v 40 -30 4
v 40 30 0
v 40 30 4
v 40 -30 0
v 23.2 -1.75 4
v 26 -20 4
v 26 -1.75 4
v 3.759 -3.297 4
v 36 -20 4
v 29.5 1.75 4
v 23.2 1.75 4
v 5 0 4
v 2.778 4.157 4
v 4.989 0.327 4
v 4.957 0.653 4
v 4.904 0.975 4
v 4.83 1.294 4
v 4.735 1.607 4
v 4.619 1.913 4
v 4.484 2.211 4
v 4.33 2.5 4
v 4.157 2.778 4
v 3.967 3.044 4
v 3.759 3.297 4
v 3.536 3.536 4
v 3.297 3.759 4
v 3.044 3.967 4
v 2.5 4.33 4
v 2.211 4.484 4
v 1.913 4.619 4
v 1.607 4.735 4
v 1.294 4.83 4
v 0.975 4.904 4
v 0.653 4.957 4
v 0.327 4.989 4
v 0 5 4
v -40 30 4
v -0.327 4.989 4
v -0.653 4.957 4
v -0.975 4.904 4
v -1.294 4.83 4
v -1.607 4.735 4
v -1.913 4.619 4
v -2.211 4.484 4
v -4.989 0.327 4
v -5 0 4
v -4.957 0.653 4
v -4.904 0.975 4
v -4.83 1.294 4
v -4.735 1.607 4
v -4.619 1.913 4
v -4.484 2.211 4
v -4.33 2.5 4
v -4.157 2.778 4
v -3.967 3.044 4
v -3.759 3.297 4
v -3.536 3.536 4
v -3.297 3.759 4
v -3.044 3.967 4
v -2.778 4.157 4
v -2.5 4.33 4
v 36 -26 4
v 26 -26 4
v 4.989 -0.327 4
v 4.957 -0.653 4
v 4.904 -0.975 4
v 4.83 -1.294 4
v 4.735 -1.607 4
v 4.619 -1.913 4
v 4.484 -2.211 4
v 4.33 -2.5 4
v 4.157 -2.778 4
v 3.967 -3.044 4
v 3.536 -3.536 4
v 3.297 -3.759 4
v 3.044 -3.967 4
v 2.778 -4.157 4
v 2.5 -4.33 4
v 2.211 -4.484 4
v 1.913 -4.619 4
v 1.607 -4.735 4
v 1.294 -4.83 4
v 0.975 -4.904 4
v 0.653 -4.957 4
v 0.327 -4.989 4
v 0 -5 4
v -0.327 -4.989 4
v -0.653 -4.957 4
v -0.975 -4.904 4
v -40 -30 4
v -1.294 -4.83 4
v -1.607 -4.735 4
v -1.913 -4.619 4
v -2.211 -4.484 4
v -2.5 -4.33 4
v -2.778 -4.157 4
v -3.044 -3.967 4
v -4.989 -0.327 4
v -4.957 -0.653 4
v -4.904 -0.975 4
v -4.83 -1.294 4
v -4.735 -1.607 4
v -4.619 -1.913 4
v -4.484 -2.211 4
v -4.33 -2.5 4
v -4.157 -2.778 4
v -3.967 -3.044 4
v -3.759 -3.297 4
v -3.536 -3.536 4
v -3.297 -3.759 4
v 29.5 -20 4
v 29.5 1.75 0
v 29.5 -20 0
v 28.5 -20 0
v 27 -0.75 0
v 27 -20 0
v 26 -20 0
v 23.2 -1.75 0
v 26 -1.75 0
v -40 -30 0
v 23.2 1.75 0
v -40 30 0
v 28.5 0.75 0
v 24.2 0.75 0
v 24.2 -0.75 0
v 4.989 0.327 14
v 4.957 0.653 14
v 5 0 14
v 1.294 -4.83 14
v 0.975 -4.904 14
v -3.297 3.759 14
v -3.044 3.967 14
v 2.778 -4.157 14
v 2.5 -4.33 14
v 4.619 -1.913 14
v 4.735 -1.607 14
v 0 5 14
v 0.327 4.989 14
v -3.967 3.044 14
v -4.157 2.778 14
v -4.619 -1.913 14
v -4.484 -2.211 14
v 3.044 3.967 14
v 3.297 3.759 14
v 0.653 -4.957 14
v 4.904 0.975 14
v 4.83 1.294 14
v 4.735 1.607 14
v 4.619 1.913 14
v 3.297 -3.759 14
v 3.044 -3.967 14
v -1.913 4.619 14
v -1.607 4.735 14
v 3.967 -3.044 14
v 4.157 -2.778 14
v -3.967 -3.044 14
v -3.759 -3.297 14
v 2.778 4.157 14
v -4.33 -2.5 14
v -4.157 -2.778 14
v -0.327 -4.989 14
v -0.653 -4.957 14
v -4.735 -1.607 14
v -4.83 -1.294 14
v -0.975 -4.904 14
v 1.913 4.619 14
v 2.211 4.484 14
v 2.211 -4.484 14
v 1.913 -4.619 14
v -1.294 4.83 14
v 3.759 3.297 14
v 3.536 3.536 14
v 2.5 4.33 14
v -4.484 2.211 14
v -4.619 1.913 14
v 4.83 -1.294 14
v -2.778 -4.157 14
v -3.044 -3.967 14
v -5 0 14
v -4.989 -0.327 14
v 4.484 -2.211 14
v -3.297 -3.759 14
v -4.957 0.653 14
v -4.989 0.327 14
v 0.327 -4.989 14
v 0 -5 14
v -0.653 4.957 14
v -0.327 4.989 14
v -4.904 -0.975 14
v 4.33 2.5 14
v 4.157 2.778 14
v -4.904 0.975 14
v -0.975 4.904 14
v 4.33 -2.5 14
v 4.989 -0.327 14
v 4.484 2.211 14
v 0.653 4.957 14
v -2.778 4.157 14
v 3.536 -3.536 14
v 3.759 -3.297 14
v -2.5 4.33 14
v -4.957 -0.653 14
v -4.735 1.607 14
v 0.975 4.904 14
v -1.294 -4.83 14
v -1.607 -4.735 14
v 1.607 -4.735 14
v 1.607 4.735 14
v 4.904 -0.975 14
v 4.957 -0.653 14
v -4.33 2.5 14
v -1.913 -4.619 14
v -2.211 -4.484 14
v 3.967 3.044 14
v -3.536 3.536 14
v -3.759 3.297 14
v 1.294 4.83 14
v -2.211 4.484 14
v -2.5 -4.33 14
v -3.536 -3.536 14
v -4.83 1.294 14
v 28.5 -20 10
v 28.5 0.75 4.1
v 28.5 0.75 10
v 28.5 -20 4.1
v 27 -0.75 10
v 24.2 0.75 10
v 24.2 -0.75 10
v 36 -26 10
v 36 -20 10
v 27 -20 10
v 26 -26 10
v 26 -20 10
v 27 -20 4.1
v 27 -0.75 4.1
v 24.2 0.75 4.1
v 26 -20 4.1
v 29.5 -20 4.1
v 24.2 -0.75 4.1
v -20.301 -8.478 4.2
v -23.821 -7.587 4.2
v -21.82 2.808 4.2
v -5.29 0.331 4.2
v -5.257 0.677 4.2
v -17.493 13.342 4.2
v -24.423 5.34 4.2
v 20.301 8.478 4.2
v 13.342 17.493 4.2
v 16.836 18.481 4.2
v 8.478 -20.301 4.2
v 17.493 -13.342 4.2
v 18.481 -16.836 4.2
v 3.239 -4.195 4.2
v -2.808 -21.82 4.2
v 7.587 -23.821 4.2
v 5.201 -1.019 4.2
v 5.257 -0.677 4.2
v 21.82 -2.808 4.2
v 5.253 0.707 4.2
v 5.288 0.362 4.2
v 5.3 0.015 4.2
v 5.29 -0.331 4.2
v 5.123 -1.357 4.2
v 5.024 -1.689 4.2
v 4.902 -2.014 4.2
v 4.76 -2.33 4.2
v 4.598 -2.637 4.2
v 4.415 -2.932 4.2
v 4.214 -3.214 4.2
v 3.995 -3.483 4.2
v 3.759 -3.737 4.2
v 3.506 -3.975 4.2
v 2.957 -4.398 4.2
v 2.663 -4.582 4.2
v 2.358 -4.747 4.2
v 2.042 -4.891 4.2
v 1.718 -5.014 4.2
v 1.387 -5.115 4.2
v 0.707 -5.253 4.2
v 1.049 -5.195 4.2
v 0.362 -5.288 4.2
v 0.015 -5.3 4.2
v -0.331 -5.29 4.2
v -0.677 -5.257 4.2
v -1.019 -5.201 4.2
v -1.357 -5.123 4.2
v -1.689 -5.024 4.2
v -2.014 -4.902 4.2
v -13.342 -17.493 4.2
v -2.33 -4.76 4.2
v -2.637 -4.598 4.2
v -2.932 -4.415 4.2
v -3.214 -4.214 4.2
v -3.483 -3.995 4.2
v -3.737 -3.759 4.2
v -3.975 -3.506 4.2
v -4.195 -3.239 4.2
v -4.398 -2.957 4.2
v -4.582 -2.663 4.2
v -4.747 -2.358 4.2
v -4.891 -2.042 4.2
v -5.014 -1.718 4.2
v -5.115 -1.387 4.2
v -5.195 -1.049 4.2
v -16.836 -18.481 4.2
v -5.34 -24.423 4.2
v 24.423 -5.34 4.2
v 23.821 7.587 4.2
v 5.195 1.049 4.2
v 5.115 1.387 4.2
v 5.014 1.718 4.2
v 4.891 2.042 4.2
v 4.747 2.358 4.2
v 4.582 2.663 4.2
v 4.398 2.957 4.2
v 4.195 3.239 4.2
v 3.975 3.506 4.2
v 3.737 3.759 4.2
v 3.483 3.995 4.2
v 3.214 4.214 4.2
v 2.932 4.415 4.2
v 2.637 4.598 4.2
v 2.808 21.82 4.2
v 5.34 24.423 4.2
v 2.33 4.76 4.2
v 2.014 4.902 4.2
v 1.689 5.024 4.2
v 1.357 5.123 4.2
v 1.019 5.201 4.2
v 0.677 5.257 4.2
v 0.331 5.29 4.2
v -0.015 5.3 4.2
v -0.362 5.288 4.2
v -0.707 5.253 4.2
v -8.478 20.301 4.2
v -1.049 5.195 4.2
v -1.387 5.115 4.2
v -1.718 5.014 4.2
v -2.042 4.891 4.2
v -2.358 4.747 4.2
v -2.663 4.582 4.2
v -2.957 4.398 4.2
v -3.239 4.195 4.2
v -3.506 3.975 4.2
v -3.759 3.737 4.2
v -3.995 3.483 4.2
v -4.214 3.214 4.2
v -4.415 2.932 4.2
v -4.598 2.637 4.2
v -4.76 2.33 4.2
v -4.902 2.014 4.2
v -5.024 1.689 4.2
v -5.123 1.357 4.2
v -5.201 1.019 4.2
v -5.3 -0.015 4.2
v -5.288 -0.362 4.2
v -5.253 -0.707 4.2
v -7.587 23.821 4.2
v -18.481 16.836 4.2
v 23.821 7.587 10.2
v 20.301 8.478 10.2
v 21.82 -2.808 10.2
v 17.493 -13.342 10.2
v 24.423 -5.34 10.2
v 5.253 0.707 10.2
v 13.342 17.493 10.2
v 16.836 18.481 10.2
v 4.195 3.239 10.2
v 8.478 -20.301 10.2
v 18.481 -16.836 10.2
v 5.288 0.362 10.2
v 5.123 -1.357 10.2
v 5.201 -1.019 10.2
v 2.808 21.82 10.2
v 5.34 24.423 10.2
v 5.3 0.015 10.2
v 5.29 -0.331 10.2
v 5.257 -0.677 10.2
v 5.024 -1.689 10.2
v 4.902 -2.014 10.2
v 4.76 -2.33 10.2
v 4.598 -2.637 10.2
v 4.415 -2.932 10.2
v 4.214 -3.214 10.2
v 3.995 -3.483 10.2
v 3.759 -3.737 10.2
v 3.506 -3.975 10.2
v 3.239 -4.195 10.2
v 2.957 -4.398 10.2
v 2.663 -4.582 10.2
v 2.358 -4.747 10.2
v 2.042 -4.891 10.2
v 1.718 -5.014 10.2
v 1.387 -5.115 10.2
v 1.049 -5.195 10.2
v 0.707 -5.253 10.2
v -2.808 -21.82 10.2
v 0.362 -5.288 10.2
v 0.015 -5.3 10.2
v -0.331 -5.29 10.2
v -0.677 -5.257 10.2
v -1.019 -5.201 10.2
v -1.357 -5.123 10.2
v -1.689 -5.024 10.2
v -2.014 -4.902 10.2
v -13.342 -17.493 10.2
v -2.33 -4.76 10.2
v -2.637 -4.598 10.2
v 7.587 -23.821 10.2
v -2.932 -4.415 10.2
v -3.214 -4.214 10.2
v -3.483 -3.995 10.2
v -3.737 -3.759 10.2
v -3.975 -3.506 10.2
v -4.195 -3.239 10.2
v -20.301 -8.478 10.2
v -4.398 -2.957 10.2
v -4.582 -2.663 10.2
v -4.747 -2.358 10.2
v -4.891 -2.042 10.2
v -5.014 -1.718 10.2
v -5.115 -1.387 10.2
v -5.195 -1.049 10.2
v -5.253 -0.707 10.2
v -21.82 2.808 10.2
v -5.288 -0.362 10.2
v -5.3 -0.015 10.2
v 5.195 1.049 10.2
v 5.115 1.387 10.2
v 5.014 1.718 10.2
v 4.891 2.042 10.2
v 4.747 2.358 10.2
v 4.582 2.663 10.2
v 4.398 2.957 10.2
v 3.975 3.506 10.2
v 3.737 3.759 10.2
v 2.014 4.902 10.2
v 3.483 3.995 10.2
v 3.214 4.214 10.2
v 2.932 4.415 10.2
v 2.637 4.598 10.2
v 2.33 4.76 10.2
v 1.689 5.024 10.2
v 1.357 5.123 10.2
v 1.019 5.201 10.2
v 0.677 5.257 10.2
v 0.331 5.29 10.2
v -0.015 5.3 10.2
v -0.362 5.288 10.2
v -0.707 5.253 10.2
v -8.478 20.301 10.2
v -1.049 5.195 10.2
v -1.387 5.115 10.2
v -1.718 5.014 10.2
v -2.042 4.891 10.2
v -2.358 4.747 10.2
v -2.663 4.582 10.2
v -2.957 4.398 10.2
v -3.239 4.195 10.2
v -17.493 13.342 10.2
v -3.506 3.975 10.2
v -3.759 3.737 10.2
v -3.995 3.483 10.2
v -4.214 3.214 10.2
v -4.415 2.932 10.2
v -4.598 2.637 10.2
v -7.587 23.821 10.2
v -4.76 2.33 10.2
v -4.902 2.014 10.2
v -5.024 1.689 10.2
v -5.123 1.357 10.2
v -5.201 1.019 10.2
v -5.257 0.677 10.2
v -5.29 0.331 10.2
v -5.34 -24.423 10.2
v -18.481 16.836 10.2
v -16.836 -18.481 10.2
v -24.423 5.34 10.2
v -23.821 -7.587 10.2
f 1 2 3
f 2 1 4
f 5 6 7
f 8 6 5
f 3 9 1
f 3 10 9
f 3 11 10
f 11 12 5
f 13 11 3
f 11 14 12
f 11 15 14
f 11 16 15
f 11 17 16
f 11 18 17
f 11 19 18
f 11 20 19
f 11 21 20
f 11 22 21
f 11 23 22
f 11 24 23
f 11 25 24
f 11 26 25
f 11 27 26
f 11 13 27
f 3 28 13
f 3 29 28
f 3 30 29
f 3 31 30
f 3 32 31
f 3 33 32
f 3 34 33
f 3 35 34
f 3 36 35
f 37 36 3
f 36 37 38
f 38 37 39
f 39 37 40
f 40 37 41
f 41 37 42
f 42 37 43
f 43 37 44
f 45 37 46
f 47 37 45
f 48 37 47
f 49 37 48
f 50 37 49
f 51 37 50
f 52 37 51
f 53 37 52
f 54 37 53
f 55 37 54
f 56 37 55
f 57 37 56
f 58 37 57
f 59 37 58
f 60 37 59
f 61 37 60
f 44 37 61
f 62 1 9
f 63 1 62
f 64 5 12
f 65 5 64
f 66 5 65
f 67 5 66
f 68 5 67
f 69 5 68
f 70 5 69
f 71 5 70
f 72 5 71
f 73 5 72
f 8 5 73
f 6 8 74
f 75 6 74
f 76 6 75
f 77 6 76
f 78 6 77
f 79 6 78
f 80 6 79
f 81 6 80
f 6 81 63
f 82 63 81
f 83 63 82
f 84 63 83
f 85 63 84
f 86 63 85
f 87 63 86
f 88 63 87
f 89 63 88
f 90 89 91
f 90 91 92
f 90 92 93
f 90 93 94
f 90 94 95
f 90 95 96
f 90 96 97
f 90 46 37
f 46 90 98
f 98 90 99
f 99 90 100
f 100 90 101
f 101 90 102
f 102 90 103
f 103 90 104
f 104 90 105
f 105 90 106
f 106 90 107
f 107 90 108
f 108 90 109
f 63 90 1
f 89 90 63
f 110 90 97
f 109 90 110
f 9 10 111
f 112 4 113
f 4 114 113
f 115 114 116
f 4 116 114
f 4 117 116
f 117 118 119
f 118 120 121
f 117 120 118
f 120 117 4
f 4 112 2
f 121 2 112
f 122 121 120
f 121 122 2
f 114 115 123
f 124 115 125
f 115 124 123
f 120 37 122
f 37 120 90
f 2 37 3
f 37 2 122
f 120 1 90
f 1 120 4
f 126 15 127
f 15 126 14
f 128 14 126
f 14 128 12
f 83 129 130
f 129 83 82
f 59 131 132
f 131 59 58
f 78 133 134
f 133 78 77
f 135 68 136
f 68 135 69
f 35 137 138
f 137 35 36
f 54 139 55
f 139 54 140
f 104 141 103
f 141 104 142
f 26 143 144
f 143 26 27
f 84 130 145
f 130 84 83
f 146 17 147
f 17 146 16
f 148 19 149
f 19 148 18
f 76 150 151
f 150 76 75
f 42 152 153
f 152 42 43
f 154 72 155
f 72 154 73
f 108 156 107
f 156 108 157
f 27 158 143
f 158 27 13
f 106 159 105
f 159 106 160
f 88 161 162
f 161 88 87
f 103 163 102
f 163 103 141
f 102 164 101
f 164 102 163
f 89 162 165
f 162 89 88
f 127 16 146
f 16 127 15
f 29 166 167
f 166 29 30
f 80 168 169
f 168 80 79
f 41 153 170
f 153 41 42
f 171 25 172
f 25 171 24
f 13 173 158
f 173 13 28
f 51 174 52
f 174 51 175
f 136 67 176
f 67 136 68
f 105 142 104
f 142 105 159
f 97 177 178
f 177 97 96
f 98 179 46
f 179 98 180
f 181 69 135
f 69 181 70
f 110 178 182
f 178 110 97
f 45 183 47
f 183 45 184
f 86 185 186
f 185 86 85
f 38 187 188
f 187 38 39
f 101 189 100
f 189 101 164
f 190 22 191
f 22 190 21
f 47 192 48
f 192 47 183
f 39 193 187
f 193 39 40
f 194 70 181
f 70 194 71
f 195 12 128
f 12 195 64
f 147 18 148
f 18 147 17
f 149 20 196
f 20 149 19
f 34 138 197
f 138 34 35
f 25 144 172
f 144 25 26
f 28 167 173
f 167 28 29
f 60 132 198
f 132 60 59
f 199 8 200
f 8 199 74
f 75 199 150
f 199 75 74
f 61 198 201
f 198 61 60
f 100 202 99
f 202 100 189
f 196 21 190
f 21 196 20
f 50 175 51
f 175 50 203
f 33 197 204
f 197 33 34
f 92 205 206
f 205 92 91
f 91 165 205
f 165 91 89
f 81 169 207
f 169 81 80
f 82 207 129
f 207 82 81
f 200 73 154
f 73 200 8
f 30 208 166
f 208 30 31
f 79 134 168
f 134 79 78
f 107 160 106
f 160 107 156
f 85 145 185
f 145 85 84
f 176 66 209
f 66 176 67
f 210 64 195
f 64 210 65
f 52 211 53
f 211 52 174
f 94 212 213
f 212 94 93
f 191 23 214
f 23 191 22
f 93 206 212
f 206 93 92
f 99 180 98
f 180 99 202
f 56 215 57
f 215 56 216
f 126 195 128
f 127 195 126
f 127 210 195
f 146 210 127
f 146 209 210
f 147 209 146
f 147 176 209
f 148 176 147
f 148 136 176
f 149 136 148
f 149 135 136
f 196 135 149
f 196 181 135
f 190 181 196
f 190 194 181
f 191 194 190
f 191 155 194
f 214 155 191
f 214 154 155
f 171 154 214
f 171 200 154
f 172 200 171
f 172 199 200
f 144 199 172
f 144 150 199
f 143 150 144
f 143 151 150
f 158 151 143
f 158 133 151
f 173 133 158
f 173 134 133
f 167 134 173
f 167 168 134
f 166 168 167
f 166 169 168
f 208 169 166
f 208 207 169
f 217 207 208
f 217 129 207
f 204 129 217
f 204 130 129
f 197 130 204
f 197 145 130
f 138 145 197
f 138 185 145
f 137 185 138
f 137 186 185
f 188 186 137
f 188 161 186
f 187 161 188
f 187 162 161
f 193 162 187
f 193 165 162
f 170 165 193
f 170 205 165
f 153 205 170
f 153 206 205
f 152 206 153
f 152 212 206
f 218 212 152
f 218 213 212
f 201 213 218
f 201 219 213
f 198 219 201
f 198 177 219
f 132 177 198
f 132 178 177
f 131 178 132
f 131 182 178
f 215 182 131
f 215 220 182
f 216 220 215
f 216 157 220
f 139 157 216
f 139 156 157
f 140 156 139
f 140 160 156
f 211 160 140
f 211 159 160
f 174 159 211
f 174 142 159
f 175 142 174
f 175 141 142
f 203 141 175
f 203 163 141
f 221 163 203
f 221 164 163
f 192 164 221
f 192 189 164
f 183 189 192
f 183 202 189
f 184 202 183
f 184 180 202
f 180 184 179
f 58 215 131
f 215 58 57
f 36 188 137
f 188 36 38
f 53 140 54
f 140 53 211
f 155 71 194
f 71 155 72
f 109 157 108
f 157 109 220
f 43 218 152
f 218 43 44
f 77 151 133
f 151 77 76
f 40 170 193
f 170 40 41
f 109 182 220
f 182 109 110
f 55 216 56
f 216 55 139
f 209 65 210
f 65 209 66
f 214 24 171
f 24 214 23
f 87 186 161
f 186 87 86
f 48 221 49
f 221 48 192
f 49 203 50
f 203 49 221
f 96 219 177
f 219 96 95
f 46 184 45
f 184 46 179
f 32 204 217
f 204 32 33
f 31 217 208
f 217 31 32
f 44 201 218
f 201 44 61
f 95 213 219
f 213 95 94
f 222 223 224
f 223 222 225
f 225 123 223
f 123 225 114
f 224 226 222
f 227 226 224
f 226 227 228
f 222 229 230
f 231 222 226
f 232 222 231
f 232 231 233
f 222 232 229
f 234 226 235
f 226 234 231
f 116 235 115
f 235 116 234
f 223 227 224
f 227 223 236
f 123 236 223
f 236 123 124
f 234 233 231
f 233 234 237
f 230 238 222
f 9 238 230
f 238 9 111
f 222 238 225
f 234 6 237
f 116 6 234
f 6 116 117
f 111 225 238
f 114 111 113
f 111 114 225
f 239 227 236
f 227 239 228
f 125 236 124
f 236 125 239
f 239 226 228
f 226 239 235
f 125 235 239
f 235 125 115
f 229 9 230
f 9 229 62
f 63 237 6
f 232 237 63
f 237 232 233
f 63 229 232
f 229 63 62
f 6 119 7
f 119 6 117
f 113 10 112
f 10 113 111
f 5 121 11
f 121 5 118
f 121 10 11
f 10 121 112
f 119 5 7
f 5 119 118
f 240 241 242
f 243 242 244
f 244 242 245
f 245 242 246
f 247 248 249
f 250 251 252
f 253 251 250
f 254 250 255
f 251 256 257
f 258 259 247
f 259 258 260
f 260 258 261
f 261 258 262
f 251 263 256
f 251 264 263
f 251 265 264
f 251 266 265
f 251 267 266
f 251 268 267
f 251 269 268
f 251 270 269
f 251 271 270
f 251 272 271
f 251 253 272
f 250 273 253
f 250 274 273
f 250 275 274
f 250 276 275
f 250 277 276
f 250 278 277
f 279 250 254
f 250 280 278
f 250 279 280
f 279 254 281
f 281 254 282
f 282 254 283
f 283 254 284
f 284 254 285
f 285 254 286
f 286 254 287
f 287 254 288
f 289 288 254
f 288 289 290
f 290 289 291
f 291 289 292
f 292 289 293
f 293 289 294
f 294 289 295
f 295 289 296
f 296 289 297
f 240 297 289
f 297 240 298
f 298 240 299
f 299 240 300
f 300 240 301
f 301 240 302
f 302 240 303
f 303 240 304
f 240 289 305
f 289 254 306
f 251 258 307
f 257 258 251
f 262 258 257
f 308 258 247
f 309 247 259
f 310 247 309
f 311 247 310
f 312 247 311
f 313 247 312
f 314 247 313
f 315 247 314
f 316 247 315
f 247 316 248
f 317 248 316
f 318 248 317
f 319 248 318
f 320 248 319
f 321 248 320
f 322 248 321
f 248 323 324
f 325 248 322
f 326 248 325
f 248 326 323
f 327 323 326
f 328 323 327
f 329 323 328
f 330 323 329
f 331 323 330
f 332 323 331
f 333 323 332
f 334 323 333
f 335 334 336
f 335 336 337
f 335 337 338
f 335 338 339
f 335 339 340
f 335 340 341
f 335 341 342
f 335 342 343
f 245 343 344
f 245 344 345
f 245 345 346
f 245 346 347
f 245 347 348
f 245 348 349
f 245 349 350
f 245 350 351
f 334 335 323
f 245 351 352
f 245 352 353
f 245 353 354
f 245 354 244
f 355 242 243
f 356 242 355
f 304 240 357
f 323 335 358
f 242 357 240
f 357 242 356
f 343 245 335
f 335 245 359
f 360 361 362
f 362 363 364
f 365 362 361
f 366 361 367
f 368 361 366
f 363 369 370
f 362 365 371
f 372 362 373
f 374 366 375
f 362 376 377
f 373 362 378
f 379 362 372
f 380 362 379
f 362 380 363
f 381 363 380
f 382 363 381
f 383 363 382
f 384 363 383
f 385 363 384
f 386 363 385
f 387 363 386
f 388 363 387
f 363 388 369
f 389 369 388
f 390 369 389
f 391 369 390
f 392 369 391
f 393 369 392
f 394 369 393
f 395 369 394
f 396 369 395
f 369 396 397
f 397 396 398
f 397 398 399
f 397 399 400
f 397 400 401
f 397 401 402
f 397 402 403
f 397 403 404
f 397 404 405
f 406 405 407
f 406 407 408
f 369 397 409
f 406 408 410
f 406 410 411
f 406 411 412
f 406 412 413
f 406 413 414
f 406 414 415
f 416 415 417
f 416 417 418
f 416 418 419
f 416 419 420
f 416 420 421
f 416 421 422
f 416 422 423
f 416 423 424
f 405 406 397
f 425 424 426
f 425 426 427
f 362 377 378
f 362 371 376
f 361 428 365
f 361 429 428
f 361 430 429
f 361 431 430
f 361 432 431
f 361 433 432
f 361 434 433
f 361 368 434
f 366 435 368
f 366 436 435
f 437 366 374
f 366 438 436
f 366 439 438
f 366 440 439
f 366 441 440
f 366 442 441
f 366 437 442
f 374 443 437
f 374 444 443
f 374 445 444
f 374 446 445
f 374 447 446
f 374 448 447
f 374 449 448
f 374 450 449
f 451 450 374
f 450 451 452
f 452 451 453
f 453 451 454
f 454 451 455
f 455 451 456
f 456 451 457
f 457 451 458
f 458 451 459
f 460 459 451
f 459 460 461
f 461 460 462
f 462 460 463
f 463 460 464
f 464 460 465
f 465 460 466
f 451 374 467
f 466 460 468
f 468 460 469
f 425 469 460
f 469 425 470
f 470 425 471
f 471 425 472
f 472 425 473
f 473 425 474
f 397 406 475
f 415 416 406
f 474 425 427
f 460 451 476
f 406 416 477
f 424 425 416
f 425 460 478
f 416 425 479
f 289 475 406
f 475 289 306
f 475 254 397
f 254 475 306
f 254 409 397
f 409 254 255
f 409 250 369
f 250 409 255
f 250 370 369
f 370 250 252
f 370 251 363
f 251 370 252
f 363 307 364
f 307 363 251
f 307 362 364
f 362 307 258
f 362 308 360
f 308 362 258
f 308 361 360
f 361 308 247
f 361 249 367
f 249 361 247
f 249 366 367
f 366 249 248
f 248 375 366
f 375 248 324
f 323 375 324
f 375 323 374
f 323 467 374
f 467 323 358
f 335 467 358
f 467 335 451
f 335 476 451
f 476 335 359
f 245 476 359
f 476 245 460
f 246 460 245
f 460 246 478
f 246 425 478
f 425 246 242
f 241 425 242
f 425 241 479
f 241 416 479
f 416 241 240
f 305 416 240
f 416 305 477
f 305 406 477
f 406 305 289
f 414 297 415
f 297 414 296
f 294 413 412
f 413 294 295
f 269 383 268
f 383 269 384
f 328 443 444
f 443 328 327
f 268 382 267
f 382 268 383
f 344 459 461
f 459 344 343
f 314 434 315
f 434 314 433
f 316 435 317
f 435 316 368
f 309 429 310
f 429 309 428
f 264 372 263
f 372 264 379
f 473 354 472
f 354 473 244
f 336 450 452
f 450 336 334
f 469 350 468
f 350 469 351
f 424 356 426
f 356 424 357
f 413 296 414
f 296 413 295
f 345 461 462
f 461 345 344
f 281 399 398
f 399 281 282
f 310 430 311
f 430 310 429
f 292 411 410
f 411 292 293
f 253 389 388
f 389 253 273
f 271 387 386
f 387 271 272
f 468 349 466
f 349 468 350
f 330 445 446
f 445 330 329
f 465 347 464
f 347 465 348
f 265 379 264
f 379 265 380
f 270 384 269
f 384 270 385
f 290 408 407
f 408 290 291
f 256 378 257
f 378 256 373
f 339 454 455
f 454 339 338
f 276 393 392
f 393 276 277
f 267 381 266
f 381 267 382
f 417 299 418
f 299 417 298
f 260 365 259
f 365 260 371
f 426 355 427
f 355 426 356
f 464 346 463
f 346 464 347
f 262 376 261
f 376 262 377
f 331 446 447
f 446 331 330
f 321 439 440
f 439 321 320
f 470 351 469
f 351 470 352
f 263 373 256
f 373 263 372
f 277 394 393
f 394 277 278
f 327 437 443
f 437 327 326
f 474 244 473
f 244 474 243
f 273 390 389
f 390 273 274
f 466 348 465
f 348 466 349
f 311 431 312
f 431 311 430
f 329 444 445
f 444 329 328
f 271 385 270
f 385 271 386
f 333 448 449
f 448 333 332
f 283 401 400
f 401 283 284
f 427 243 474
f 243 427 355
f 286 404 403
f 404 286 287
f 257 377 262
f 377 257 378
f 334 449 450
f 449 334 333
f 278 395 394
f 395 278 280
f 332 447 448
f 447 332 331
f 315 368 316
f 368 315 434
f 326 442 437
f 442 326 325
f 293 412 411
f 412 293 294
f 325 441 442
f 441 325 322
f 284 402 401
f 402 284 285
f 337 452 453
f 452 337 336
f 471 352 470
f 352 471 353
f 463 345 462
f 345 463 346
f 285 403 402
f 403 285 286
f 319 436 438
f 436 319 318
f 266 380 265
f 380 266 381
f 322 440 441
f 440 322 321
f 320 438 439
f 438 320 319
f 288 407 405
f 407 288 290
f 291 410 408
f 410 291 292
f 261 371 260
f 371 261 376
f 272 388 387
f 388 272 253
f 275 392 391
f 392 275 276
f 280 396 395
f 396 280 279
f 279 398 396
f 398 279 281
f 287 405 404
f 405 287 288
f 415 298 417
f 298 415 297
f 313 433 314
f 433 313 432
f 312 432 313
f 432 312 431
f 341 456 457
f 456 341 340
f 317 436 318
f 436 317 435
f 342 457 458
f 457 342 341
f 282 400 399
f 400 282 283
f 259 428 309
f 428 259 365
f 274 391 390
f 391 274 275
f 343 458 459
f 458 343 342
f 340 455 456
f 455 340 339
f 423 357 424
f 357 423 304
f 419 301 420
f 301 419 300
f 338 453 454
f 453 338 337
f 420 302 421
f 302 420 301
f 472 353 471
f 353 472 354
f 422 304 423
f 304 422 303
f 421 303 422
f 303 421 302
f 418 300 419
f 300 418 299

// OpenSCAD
cadverify_only = "";
module instance(name, part, unit = 1) {
    echo(cadverify_instance = [name, part, unit]);
    if (cadverify_only == "" || cadverify_only == name) children();
}

// Part selector: base, wheel, assembly
part = "assembly"; // [base, wheel, assembly]

$fn = 96;

// Parameters
Rt = 25;        // wheel tip radius (50mm across)
Rr = 22;        // wheel root radius
Nteeth = 12;
wheel_t = 6;    // wheel thickness
bore_r = 5.3;   // wheel bore radius (post 5.0 + 0.3 clearance)
post_r = 5;
post_h = 14;    // base bottom to post top
base_t = 4;     // base plate thickness
plate_x = 80;
plate_y = 60;
gap_angle = 37.3333333; // gap center for nominal assembly

module wheel() {
    pts = [ for (k=[0:2*Nteeth-1])
        let(i=floor(k/2),
            a = (k%2==0) ? i*360/Nteeth : i*360/Nteeth+25,
            r = (k%2==0) ? Rr : Rt)
        [r*cos(a), r*sin(a)] ];
    difference() {
        linear_extrude(height=wheel_t, convexity=4)
            polygon(pts);
        translate([0,0,-0.1])
            cylinder(h=wheel_t+0.2, r=bore_r);
    }
}

module base() {
    difference() {
        union() {
            // plate
            translate([-plate_x/2, -plate_y/2, 0])
                cube([plate_x, plate_y, base_t]);
            // post
            cylinder(h=post_h, r=post_r);
            // pawl backbone (tall)
            translate([27, -20, 0])
                cube([1.5, 20.75, 10]);
            // pawl finger (tall, radial)
            translate([24.2, -0.75, 0])
                cube([4.3, 1.5, 10]);
            // anchor block (full height fixation)
            translate([26, -26, 0])
                cube([10, 6, 10]);
        }
        // slot voids through plate (z -0.1..4.1)
        translate([26, -20, -0.1]) cube([1, 19.25, 4.2]);      // west of backbone
        translate([28.5, -20, -0.1]) cube([1, 20.75, 4.2]);    // east of backbone
        translate([23.2, 0.75, -0.1]) cube([6.3, 1, 4.2]);      // north
        translate([23.2, -1.75, -0.1]) cube([3.8, 1, 4.2]);     // south of finger tip
        translate([23.2, -1.75, -0.1]) cube([1, 3.5, 4.2]);     // west of tip
    }
}

if (part == "wheel") {
    echo(cadverify_spec = [
        ["bounds", [[-25, -25, 0], [25, 25, 6]]],
        ["bodies", 1],
        ["through_holes", 1],
        ["support_faces", [["bottom", "-z", 1000]]],
        ["overhangs_allowed", []],
        ["copies", 1],
        ["details", [
            ["hub", "material", [[5, 5, 0.5], [10, 10, 5.5]], 0.9],
            ["bore", "hole", [0, 0, 7], [0, 0, -1], [[0, 10.6], [5, 10.6]]],
            ["rim", "thickness", [15, 0, 7], [0, 0, -1], 6],
            ["teeth", "view", [[20, -15, 0], [25, 15, 6]]]
        ]]
    ]);
    wheel();
} else if (part == "base") {
    echo(cadverify_spec = [
        ["bounds", [[-40, -30, 0], [40, 30, 14]]],
        ["bodies", 1],
        ["through_holes", 1],
        ["support_faces", [["bottom", "-z", 4000]]],
        ["overhangs_allowed", []],
        ["copies", 1],
        ["details", [
            ["pawl_arm", "material", [[27.1, -10, 4.1], [28.4, -5, 9.9]], 0.9],
            ["slot", "void", [[26.1, -15, 0.5], [26.9, -5, 3.5]], 0.9],
            ["base_floor", "thickness", [-20, 20, -1], [0, 0, 1], 4],
            ["pawl_tip", "view", [[23, -2, 4], [26, 2, 10]]]
        ]]
    ]);
    base();
} else if (part == "assembly") {
    echo(cadverify_spec = [
        ["bounds", [[-40, -30, 0], [40, 30, 14]]],
        ["support_faces", [["table", "-z", 4000]]],
        ["motions", [
            ["free", ["wheel1"], "rotate", [0, 0, 4], [0, 0, 1], [0, -30],
                ["flex", [["wheel1", "base1", 1.0, "pawl arm bends as tooth passes"]]]],
            ["locked", ["wheel1"], "rotate", [0, 0, 4], [0, 0, 1], [0, 10],
                ["stops", [10]]]
        ]],
        ["assembly_order", [
            [["base1"], [0, 0, 0]],
            [["wheel1"], [0, 0, -1]]
        ]]
    ]);
    instance("base1", "base") base();
    instance("wheel1", "wheel") translate([0, 0, 4.2]) rotate([0, 0, -gap_angle]) wheel();
}
